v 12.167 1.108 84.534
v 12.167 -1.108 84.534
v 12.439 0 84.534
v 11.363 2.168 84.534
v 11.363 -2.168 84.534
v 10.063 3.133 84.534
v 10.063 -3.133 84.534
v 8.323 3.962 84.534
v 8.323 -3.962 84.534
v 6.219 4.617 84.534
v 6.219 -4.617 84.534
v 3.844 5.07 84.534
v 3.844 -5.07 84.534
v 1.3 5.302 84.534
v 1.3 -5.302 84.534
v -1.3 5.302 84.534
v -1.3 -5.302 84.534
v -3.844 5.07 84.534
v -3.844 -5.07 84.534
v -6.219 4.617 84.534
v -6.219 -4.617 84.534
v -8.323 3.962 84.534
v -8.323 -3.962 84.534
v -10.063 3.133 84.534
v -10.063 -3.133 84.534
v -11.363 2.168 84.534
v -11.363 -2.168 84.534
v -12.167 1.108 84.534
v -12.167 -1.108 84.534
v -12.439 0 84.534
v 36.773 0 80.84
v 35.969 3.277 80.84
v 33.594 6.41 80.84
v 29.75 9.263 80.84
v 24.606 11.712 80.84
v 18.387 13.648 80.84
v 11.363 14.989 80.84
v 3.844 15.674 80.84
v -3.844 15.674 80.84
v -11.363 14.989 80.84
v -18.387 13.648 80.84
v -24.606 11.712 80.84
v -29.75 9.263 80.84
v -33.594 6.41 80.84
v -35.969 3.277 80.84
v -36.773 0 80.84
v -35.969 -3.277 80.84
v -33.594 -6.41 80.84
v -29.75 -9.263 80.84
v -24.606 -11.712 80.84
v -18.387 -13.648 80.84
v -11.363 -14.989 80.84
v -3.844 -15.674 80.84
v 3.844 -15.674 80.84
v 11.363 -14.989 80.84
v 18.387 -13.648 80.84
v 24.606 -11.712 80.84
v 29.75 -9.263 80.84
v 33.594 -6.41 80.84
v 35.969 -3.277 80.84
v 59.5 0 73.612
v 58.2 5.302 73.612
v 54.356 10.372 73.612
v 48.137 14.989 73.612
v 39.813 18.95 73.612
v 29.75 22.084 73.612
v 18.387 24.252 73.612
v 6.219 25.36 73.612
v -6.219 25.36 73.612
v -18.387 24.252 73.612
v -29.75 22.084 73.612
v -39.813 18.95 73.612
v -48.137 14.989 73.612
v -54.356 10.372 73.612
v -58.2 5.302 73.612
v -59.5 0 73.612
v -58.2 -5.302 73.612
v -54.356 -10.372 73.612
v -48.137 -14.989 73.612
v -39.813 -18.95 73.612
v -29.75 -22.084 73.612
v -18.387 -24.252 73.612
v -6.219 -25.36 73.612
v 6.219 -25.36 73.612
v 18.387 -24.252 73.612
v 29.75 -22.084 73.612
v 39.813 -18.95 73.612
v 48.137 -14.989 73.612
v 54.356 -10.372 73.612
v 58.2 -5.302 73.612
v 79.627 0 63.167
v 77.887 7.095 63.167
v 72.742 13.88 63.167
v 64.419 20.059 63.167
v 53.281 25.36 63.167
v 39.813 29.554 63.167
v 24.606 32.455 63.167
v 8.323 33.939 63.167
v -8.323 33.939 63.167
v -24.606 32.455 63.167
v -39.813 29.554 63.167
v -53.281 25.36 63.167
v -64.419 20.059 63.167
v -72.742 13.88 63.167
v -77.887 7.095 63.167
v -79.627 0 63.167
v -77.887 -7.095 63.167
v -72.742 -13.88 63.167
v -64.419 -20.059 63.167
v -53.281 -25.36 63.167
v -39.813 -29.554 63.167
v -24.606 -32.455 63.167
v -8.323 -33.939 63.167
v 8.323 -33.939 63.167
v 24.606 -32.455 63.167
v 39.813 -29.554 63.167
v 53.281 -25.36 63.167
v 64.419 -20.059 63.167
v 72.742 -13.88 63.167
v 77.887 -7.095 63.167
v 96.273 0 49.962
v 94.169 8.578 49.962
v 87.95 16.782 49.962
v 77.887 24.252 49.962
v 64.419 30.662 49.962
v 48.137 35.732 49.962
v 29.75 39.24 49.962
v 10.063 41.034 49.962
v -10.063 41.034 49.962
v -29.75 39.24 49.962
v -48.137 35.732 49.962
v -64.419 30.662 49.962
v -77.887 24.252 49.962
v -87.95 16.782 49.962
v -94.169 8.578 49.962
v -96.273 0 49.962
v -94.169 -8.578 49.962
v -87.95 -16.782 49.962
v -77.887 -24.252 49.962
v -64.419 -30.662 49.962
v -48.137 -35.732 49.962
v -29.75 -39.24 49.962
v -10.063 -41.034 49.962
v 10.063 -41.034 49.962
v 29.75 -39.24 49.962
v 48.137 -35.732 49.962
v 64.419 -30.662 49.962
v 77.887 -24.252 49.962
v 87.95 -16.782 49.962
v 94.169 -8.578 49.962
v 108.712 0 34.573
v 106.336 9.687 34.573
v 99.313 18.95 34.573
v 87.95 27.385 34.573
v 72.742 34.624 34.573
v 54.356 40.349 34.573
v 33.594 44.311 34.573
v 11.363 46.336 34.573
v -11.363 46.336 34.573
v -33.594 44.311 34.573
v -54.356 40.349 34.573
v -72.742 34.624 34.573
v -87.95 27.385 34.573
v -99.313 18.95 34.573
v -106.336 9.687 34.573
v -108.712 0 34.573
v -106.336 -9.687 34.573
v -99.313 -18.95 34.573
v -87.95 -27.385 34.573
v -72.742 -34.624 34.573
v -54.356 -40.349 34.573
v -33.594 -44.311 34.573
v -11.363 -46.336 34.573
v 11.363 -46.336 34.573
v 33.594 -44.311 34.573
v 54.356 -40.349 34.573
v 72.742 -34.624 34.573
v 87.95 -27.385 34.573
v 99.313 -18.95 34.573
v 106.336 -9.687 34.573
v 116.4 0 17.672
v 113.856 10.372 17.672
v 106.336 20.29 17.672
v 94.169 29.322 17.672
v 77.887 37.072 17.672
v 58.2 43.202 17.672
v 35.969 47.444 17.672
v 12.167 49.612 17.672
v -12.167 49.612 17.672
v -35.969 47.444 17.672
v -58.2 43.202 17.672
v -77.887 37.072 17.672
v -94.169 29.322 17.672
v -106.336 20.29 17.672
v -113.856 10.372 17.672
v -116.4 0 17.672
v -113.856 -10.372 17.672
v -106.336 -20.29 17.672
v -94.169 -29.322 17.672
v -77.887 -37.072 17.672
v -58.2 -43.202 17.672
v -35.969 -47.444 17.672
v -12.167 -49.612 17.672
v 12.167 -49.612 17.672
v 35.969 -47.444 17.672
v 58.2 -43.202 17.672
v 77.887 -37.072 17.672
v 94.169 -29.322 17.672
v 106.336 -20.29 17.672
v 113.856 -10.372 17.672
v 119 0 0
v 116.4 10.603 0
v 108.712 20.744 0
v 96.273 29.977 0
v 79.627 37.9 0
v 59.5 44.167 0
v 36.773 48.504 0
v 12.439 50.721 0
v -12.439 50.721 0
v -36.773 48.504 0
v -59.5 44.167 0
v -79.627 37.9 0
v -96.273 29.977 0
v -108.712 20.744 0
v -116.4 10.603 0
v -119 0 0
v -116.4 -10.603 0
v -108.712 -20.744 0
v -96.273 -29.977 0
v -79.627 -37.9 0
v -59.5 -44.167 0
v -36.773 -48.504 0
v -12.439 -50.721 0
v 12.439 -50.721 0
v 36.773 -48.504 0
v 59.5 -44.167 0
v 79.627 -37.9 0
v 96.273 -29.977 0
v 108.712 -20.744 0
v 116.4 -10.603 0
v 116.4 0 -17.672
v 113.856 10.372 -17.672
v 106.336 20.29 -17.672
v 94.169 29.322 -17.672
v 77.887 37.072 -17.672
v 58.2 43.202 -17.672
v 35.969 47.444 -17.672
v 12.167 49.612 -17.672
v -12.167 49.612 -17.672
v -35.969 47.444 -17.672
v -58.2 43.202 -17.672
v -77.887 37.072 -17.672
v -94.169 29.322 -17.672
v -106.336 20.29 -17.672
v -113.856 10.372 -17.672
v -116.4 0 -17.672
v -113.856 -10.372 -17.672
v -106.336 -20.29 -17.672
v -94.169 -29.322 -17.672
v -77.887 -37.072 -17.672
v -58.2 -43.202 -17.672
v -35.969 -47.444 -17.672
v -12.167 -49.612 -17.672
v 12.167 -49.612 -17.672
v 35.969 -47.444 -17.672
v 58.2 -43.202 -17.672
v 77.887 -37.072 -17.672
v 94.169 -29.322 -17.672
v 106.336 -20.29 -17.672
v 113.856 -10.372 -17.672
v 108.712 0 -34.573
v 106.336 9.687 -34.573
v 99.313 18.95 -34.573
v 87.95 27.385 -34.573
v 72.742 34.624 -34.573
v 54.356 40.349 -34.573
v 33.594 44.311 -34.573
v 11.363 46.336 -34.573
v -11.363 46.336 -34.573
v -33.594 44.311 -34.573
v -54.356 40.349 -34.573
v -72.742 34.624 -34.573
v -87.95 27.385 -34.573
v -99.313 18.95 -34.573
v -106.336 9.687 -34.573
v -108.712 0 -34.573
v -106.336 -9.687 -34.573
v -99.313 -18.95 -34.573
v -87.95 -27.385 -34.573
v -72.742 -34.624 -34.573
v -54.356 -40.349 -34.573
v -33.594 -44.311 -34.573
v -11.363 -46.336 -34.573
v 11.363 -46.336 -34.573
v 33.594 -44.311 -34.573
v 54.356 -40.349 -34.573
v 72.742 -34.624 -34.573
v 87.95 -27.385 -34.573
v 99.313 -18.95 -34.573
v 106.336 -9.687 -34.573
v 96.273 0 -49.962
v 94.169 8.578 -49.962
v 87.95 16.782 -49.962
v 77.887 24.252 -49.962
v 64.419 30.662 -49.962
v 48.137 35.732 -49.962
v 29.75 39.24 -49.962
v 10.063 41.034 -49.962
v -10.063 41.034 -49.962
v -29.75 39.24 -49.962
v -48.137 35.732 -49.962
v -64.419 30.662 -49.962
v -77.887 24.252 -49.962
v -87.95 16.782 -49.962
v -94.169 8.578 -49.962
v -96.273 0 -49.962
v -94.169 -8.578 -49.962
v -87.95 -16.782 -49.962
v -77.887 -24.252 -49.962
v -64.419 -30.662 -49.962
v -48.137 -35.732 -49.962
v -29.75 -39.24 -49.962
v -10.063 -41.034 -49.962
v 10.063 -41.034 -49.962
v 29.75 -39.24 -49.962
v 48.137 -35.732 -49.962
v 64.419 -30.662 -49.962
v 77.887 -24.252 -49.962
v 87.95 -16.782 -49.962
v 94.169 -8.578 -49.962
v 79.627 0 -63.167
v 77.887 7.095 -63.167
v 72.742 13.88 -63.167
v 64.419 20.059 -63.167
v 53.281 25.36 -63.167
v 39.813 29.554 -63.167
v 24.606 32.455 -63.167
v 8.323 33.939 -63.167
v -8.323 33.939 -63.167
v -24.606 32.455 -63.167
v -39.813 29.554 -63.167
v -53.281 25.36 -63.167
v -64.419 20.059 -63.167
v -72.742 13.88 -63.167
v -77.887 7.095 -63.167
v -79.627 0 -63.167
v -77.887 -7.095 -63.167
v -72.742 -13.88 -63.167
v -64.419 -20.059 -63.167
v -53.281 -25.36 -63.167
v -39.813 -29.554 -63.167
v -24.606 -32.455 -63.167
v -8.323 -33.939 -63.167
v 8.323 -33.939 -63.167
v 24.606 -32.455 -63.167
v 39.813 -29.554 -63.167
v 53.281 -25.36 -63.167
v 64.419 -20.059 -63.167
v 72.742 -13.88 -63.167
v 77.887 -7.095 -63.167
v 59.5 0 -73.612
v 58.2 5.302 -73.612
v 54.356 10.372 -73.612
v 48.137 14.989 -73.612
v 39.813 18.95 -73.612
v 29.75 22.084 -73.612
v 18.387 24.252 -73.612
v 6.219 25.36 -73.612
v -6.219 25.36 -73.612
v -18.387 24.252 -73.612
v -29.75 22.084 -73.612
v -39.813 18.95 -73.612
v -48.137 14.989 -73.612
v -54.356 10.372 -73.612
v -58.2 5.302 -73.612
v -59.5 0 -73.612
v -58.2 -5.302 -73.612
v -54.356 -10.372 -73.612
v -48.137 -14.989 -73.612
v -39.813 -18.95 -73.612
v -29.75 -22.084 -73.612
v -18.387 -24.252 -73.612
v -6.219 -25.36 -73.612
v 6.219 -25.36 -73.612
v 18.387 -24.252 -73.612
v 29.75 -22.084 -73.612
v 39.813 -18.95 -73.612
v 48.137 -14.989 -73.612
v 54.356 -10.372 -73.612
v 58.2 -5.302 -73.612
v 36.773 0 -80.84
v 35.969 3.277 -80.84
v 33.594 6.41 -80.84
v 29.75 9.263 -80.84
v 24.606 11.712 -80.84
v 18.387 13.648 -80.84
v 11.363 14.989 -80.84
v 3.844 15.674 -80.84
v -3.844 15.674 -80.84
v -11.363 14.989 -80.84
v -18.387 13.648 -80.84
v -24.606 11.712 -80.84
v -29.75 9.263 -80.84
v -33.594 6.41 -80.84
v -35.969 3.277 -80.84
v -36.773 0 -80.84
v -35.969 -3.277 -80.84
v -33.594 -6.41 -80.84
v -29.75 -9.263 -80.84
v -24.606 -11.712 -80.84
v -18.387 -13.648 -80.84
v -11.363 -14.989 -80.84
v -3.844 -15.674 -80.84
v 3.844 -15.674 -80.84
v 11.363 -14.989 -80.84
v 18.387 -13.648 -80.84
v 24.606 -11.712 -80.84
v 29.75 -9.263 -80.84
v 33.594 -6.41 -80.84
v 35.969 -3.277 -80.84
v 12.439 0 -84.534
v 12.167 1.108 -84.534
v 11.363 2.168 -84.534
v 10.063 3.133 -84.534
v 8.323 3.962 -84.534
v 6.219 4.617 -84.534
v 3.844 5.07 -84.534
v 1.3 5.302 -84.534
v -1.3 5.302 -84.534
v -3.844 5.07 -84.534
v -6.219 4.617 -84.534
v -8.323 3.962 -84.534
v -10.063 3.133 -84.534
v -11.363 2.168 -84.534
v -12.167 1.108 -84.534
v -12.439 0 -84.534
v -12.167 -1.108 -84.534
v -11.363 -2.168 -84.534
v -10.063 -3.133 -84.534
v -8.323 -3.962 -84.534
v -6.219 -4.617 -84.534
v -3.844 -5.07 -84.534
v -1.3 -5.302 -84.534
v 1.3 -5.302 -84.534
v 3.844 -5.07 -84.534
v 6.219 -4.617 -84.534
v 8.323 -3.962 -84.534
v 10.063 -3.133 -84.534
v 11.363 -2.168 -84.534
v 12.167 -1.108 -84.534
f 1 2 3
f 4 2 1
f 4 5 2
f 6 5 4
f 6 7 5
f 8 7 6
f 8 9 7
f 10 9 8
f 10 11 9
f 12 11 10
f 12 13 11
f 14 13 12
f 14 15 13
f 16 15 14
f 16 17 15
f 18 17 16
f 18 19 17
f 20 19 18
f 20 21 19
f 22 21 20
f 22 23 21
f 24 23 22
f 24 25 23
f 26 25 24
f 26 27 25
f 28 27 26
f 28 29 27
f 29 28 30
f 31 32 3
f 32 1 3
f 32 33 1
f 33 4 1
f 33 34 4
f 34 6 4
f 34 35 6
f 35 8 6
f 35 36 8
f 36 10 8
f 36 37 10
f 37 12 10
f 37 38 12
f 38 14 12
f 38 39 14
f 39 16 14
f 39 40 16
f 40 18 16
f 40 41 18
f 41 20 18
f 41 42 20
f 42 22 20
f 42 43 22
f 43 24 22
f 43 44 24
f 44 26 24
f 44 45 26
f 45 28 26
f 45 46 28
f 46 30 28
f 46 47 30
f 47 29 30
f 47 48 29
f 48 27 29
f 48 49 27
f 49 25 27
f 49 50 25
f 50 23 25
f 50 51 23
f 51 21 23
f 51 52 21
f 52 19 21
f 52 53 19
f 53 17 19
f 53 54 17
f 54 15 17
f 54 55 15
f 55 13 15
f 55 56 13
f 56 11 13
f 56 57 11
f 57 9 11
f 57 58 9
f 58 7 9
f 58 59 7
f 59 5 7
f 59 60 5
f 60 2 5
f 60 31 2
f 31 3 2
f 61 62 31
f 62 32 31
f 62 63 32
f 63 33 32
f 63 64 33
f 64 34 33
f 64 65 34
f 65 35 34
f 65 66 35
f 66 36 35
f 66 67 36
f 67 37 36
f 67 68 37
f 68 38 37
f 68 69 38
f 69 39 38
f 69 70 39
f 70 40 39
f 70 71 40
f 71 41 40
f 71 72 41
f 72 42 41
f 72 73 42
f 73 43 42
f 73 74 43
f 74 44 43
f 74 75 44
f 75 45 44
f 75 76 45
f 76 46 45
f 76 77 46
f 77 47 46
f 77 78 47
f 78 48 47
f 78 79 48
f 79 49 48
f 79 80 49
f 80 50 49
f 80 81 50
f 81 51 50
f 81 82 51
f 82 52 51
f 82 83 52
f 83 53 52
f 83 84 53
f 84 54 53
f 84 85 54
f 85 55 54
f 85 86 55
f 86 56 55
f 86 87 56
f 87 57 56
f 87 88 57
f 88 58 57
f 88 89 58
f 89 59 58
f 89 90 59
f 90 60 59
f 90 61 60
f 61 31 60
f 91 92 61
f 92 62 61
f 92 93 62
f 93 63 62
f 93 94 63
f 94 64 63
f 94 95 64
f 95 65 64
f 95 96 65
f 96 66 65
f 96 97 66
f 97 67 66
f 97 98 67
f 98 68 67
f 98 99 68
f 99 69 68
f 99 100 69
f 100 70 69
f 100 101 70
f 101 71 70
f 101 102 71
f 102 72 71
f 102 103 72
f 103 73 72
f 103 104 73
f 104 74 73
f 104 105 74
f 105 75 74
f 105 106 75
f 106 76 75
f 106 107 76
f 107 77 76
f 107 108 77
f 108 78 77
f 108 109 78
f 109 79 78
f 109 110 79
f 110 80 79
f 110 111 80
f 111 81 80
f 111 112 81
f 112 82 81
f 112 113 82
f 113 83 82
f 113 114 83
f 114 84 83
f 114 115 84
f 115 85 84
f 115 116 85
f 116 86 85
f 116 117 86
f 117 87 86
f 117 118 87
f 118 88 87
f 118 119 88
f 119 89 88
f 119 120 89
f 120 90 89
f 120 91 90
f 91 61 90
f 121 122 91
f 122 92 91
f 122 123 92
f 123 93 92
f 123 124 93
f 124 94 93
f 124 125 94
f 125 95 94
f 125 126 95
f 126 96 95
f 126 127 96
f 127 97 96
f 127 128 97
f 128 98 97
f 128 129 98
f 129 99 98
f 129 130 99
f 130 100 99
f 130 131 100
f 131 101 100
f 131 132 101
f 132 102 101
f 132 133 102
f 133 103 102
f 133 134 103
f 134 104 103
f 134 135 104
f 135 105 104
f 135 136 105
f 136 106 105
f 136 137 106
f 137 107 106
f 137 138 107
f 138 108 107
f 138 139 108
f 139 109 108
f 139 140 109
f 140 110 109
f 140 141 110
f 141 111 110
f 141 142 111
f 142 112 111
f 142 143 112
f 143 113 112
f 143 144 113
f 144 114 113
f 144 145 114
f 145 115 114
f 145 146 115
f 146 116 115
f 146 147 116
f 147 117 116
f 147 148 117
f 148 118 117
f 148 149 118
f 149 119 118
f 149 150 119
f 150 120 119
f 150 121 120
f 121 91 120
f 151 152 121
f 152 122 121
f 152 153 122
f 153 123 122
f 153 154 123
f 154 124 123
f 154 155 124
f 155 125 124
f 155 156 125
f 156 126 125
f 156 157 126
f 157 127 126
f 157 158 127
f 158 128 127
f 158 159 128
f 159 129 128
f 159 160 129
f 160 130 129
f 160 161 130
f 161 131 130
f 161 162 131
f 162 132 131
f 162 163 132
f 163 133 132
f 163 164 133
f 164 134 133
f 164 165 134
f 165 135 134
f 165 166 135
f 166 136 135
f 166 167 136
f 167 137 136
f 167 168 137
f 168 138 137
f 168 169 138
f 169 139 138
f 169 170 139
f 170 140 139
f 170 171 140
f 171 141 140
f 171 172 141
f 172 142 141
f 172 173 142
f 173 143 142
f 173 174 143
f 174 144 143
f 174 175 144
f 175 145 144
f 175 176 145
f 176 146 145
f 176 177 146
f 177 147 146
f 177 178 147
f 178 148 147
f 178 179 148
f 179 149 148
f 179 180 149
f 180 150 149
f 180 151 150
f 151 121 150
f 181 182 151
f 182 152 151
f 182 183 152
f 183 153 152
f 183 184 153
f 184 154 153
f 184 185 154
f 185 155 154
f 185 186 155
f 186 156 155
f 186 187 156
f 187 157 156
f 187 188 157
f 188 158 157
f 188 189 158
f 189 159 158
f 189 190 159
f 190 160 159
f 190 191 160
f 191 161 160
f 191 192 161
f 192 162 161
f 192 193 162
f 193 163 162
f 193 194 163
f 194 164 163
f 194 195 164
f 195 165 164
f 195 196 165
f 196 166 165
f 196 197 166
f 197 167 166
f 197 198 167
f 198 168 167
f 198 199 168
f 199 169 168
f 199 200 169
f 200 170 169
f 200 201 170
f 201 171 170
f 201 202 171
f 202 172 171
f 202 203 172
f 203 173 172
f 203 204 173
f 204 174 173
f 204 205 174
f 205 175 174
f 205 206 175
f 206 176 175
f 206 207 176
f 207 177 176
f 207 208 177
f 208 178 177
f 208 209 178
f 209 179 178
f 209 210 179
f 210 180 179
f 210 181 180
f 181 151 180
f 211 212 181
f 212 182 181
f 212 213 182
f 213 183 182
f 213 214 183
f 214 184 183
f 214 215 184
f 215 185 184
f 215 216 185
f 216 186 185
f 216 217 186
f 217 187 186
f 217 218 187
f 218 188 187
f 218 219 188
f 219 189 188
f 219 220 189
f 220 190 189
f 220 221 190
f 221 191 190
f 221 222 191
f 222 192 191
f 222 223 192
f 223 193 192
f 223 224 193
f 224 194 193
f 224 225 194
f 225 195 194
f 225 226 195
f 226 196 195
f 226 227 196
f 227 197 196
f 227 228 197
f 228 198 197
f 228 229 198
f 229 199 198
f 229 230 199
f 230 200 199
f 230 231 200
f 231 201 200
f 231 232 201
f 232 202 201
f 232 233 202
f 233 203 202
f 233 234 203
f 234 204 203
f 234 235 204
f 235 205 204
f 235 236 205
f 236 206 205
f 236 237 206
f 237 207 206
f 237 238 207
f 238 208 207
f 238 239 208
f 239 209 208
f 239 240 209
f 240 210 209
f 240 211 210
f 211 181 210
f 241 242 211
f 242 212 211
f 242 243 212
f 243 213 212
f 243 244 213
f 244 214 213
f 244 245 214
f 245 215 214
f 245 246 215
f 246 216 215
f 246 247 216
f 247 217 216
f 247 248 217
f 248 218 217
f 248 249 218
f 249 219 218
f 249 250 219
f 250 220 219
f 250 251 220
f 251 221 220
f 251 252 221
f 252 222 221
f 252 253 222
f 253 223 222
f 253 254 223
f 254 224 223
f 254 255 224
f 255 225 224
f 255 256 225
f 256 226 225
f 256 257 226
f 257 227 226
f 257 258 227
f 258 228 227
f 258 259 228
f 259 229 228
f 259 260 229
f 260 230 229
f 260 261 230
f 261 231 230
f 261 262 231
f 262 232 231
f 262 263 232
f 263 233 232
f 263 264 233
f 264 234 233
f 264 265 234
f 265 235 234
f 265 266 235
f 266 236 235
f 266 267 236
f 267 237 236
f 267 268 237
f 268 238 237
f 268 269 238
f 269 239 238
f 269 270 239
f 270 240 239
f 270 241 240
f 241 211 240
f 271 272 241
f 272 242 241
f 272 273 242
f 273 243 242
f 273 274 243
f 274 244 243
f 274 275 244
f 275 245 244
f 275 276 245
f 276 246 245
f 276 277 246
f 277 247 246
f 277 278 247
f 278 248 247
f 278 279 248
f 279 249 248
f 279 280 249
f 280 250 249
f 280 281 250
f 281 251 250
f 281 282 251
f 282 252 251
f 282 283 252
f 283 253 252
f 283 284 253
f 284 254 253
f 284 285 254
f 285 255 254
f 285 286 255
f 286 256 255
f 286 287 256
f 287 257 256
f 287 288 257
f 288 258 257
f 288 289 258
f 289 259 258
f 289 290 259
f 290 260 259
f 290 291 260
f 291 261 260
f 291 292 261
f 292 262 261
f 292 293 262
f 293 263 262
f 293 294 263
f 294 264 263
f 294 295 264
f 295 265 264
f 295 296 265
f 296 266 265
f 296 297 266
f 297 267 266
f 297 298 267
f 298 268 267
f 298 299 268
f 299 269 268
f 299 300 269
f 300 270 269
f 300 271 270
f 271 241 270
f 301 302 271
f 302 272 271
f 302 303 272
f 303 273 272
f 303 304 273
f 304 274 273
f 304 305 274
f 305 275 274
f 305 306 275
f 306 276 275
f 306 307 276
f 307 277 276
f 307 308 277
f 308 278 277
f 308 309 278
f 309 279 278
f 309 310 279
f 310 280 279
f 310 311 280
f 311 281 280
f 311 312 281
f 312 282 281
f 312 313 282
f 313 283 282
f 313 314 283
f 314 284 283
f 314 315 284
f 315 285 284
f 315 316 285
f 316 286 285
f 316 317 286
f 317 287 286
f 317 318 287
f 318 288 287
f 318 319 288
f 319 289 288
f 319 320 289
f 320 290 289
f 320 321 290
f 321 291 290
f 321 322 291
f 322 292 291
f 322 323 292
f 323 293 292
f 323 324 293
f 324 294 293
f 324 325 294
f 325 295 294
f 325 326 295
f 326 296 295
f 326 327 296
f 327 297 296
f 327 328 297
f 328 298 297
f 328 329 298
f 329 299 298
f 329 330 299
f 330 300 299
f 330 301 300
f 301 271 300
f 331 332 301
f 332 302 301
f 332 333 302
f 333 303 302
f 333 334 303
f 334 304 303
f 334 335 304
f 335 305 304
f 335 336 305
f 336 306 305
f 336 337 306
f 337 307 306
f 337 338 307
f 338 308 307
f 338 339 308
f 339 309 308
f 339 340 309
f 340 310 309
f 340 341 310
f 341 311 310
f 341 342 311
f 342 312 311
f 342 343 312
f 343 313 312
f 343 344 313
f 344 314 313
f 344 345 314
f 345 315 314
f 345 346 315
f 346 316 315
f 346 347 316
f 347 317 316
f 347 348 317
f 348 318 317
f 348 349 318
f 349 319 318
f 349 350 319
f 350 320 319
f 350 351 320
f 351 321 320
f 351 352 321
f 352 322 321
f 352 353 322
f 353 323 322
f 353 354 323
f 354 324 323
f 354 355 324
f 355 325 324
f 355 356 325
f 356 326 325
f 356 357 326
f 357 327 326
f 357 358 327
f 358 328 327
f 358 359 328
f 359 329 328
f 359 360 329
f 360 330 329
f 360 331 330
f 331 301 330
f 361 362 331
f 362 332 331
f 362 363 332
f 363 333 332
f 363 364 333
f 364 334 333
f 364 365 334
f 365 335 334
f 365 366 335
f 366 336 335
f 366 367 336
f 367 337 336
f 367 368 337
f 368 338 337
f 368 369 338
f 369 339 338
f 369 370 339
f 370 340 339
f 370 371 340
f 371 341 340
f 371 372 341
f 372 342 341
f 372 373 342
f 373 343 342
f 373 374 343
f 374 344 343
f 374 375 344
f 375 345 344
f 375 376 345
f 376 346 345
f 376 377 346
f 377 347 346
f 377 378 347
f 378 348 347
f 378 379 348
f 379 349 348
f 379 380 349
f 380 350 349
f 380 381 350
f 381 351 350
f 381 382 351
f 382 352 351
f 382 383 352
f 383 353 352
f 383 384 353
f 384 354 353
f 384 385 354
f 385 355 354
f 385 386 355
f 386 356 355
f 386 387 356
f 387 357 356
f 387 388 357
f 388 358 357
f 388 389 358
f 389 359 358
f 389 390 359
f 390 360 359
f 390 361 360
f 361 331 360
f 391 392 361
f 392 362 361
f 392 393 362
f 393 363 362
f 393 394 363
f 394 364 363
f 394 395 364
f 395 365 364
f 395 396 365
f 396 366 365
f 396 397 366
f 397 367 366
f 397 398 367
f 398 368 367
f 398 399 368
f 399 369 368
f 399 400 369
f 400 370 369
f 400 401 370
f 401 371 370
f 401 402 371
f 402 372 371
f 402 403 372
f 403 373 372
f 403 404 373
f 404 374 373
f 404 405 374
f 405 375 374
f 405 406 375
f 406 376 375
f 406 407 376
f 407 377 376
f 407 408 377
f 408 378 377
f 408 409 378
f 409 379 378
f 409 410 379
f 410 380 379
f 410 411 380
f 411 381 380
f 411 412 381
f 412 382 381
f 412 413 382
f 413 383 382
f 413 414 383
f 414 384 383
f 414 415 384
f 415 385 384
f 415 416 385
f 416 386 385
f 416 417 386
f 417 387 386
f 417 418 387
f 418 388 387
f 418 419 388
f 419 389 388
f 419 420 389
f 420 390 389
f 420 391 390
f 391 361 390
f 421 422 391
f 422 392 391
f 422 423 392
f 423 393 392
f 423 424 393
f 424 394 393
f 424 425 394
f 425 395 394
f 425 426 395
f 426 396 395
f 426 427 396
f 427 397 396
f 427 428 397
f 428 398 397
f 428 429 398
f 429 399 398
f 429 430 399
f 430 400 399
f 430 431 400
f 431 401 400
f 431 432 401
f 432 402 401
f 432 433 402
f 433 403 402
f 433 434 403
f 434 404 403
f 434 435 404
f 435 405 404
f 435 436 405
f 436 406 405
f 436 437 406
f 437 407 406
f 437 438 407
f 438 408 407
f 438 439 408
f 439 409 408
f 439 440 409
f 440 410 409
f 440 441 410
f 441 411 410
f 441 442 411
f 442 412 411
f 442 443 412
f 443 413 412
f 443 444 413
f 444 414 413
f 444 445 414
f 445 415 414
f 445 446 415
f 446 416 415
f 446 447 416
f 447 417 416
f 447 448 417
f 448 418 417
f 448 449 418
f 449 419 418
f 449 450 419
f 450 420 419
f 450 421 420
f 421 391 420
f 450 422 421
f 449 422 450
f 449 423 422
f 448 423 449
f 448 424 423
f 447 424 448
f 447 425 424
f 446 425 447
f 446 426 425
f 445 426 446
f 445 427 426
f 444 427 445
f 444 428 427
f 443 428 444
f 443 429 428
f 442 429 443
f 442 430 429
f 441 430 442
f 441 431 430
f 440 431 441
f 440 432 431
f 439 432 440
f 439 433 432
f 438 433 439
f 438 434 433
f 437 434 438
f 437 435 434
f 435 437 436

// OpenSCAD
// Generated by SolidPython 1.0.1 on 2020-07-29 00:46:47


scale(v = [7, 3, 5]) {
	sphere(r = 17);
}
/***********************************************
*********      SolidPython code:      **********
************************************************
 
# import packages: SolidPython
from solid import *
from solid.utils import *
from itertools import chain, combinations, permutations


class Resize:

    def __init__(self, scad_file):
        self.scad_file = scad_file
        #self.scad_file = import_scad(scad_file)
        # cone/cylinder param:
        self.r1 = 0
        self.r2 = 0
        self.h = 0
        # rectangular prism param:
        self.w = 0
        self.l = 0
        # ellipse param:
        self.r = 0

    # import OpenScad code (file name corresponds to shape)


    # classify shape + parameters
    def assign(self, param1, param2, param3):
        if self.scad_file == 'cone.scad':
            self.r1 = param1
            self.r2 = param2
            self.h = param3
        elif self.scad_file == 'cylinder.scad':
            self.r1 = param1
            self.r2 = param2
            self.h = param3
        elif self.scad_file == 'rectangularPrism.scad':
            self.h = param1
            self.l = param2
            self.w = param3
        else:
            self.r = param1
            self.h = param2

    # resize parameters
    def iterate(self):
        x = range(3, 20, 2)
        i = 1
        if self.scad_file == 'cone.scad':
            tempList = list(permutations(x, 2))
            for temp in tempList:
                param1 = temp[0]
                param2 = temp[1]
                filepath = 'produced_scad_files/' + 'cone' + str(param1) + '_' + str(param2) + '_' + '.scad'
                scad_render_to_file(cylinder(h=param1, r1=param2, r2=0), filepath)

        elif self.scad_file == 'cylinder.scad':
            tempList = list(permutations(x, 3))
            for temp in tempList:
                param1 = temp[0]
                param2 = temp[1]
                filepath = 'produced_scad_files/' + 'cylinder' + str(param1) + '_' + str(param2) + '_' + '.scad'
                scad_render_to_file(cylinder(h=param1, r1=param2, r2=param2), filepath)

        elif self.scad_file == 'rectangularPrism.scad':
            tempList = list(permutations(x, 3))
            for temp in tempList:
                param1 = temp[0]
                param2 = temp[1]
                param3 = temp[2]
                filepath = 'produced_scad_files/' + 'rectangularPrism' + str(param1) + '_' + str(param2) + '_' + str(
                    param3) + '.scad'
                scad_render_to_file(cube(size=(param1, param2, param3)), filepath)

        elif self.scad_file == 'ellipse.scad':
            tempList = list(permutations(x, 4))
            for temp in tempList:
                param1 = temp[0]
                param2 = temp[1]
                param3 = temp[2]
                param4 = temp[3]
                filepath = 'produced_scad_files/' + 'ellipse' + str(param1) + '_' + str(param2) + '_' + str(param3) + '_' + str(param4) + '.scad'
                scad_render_to_file(scale([param1, param2, param3])(sphere(r=param4)), filepath)

    def render_to_scadfile(self):
        scad_render_to_file(scad, 'example.scad') 
 
************************************************/
